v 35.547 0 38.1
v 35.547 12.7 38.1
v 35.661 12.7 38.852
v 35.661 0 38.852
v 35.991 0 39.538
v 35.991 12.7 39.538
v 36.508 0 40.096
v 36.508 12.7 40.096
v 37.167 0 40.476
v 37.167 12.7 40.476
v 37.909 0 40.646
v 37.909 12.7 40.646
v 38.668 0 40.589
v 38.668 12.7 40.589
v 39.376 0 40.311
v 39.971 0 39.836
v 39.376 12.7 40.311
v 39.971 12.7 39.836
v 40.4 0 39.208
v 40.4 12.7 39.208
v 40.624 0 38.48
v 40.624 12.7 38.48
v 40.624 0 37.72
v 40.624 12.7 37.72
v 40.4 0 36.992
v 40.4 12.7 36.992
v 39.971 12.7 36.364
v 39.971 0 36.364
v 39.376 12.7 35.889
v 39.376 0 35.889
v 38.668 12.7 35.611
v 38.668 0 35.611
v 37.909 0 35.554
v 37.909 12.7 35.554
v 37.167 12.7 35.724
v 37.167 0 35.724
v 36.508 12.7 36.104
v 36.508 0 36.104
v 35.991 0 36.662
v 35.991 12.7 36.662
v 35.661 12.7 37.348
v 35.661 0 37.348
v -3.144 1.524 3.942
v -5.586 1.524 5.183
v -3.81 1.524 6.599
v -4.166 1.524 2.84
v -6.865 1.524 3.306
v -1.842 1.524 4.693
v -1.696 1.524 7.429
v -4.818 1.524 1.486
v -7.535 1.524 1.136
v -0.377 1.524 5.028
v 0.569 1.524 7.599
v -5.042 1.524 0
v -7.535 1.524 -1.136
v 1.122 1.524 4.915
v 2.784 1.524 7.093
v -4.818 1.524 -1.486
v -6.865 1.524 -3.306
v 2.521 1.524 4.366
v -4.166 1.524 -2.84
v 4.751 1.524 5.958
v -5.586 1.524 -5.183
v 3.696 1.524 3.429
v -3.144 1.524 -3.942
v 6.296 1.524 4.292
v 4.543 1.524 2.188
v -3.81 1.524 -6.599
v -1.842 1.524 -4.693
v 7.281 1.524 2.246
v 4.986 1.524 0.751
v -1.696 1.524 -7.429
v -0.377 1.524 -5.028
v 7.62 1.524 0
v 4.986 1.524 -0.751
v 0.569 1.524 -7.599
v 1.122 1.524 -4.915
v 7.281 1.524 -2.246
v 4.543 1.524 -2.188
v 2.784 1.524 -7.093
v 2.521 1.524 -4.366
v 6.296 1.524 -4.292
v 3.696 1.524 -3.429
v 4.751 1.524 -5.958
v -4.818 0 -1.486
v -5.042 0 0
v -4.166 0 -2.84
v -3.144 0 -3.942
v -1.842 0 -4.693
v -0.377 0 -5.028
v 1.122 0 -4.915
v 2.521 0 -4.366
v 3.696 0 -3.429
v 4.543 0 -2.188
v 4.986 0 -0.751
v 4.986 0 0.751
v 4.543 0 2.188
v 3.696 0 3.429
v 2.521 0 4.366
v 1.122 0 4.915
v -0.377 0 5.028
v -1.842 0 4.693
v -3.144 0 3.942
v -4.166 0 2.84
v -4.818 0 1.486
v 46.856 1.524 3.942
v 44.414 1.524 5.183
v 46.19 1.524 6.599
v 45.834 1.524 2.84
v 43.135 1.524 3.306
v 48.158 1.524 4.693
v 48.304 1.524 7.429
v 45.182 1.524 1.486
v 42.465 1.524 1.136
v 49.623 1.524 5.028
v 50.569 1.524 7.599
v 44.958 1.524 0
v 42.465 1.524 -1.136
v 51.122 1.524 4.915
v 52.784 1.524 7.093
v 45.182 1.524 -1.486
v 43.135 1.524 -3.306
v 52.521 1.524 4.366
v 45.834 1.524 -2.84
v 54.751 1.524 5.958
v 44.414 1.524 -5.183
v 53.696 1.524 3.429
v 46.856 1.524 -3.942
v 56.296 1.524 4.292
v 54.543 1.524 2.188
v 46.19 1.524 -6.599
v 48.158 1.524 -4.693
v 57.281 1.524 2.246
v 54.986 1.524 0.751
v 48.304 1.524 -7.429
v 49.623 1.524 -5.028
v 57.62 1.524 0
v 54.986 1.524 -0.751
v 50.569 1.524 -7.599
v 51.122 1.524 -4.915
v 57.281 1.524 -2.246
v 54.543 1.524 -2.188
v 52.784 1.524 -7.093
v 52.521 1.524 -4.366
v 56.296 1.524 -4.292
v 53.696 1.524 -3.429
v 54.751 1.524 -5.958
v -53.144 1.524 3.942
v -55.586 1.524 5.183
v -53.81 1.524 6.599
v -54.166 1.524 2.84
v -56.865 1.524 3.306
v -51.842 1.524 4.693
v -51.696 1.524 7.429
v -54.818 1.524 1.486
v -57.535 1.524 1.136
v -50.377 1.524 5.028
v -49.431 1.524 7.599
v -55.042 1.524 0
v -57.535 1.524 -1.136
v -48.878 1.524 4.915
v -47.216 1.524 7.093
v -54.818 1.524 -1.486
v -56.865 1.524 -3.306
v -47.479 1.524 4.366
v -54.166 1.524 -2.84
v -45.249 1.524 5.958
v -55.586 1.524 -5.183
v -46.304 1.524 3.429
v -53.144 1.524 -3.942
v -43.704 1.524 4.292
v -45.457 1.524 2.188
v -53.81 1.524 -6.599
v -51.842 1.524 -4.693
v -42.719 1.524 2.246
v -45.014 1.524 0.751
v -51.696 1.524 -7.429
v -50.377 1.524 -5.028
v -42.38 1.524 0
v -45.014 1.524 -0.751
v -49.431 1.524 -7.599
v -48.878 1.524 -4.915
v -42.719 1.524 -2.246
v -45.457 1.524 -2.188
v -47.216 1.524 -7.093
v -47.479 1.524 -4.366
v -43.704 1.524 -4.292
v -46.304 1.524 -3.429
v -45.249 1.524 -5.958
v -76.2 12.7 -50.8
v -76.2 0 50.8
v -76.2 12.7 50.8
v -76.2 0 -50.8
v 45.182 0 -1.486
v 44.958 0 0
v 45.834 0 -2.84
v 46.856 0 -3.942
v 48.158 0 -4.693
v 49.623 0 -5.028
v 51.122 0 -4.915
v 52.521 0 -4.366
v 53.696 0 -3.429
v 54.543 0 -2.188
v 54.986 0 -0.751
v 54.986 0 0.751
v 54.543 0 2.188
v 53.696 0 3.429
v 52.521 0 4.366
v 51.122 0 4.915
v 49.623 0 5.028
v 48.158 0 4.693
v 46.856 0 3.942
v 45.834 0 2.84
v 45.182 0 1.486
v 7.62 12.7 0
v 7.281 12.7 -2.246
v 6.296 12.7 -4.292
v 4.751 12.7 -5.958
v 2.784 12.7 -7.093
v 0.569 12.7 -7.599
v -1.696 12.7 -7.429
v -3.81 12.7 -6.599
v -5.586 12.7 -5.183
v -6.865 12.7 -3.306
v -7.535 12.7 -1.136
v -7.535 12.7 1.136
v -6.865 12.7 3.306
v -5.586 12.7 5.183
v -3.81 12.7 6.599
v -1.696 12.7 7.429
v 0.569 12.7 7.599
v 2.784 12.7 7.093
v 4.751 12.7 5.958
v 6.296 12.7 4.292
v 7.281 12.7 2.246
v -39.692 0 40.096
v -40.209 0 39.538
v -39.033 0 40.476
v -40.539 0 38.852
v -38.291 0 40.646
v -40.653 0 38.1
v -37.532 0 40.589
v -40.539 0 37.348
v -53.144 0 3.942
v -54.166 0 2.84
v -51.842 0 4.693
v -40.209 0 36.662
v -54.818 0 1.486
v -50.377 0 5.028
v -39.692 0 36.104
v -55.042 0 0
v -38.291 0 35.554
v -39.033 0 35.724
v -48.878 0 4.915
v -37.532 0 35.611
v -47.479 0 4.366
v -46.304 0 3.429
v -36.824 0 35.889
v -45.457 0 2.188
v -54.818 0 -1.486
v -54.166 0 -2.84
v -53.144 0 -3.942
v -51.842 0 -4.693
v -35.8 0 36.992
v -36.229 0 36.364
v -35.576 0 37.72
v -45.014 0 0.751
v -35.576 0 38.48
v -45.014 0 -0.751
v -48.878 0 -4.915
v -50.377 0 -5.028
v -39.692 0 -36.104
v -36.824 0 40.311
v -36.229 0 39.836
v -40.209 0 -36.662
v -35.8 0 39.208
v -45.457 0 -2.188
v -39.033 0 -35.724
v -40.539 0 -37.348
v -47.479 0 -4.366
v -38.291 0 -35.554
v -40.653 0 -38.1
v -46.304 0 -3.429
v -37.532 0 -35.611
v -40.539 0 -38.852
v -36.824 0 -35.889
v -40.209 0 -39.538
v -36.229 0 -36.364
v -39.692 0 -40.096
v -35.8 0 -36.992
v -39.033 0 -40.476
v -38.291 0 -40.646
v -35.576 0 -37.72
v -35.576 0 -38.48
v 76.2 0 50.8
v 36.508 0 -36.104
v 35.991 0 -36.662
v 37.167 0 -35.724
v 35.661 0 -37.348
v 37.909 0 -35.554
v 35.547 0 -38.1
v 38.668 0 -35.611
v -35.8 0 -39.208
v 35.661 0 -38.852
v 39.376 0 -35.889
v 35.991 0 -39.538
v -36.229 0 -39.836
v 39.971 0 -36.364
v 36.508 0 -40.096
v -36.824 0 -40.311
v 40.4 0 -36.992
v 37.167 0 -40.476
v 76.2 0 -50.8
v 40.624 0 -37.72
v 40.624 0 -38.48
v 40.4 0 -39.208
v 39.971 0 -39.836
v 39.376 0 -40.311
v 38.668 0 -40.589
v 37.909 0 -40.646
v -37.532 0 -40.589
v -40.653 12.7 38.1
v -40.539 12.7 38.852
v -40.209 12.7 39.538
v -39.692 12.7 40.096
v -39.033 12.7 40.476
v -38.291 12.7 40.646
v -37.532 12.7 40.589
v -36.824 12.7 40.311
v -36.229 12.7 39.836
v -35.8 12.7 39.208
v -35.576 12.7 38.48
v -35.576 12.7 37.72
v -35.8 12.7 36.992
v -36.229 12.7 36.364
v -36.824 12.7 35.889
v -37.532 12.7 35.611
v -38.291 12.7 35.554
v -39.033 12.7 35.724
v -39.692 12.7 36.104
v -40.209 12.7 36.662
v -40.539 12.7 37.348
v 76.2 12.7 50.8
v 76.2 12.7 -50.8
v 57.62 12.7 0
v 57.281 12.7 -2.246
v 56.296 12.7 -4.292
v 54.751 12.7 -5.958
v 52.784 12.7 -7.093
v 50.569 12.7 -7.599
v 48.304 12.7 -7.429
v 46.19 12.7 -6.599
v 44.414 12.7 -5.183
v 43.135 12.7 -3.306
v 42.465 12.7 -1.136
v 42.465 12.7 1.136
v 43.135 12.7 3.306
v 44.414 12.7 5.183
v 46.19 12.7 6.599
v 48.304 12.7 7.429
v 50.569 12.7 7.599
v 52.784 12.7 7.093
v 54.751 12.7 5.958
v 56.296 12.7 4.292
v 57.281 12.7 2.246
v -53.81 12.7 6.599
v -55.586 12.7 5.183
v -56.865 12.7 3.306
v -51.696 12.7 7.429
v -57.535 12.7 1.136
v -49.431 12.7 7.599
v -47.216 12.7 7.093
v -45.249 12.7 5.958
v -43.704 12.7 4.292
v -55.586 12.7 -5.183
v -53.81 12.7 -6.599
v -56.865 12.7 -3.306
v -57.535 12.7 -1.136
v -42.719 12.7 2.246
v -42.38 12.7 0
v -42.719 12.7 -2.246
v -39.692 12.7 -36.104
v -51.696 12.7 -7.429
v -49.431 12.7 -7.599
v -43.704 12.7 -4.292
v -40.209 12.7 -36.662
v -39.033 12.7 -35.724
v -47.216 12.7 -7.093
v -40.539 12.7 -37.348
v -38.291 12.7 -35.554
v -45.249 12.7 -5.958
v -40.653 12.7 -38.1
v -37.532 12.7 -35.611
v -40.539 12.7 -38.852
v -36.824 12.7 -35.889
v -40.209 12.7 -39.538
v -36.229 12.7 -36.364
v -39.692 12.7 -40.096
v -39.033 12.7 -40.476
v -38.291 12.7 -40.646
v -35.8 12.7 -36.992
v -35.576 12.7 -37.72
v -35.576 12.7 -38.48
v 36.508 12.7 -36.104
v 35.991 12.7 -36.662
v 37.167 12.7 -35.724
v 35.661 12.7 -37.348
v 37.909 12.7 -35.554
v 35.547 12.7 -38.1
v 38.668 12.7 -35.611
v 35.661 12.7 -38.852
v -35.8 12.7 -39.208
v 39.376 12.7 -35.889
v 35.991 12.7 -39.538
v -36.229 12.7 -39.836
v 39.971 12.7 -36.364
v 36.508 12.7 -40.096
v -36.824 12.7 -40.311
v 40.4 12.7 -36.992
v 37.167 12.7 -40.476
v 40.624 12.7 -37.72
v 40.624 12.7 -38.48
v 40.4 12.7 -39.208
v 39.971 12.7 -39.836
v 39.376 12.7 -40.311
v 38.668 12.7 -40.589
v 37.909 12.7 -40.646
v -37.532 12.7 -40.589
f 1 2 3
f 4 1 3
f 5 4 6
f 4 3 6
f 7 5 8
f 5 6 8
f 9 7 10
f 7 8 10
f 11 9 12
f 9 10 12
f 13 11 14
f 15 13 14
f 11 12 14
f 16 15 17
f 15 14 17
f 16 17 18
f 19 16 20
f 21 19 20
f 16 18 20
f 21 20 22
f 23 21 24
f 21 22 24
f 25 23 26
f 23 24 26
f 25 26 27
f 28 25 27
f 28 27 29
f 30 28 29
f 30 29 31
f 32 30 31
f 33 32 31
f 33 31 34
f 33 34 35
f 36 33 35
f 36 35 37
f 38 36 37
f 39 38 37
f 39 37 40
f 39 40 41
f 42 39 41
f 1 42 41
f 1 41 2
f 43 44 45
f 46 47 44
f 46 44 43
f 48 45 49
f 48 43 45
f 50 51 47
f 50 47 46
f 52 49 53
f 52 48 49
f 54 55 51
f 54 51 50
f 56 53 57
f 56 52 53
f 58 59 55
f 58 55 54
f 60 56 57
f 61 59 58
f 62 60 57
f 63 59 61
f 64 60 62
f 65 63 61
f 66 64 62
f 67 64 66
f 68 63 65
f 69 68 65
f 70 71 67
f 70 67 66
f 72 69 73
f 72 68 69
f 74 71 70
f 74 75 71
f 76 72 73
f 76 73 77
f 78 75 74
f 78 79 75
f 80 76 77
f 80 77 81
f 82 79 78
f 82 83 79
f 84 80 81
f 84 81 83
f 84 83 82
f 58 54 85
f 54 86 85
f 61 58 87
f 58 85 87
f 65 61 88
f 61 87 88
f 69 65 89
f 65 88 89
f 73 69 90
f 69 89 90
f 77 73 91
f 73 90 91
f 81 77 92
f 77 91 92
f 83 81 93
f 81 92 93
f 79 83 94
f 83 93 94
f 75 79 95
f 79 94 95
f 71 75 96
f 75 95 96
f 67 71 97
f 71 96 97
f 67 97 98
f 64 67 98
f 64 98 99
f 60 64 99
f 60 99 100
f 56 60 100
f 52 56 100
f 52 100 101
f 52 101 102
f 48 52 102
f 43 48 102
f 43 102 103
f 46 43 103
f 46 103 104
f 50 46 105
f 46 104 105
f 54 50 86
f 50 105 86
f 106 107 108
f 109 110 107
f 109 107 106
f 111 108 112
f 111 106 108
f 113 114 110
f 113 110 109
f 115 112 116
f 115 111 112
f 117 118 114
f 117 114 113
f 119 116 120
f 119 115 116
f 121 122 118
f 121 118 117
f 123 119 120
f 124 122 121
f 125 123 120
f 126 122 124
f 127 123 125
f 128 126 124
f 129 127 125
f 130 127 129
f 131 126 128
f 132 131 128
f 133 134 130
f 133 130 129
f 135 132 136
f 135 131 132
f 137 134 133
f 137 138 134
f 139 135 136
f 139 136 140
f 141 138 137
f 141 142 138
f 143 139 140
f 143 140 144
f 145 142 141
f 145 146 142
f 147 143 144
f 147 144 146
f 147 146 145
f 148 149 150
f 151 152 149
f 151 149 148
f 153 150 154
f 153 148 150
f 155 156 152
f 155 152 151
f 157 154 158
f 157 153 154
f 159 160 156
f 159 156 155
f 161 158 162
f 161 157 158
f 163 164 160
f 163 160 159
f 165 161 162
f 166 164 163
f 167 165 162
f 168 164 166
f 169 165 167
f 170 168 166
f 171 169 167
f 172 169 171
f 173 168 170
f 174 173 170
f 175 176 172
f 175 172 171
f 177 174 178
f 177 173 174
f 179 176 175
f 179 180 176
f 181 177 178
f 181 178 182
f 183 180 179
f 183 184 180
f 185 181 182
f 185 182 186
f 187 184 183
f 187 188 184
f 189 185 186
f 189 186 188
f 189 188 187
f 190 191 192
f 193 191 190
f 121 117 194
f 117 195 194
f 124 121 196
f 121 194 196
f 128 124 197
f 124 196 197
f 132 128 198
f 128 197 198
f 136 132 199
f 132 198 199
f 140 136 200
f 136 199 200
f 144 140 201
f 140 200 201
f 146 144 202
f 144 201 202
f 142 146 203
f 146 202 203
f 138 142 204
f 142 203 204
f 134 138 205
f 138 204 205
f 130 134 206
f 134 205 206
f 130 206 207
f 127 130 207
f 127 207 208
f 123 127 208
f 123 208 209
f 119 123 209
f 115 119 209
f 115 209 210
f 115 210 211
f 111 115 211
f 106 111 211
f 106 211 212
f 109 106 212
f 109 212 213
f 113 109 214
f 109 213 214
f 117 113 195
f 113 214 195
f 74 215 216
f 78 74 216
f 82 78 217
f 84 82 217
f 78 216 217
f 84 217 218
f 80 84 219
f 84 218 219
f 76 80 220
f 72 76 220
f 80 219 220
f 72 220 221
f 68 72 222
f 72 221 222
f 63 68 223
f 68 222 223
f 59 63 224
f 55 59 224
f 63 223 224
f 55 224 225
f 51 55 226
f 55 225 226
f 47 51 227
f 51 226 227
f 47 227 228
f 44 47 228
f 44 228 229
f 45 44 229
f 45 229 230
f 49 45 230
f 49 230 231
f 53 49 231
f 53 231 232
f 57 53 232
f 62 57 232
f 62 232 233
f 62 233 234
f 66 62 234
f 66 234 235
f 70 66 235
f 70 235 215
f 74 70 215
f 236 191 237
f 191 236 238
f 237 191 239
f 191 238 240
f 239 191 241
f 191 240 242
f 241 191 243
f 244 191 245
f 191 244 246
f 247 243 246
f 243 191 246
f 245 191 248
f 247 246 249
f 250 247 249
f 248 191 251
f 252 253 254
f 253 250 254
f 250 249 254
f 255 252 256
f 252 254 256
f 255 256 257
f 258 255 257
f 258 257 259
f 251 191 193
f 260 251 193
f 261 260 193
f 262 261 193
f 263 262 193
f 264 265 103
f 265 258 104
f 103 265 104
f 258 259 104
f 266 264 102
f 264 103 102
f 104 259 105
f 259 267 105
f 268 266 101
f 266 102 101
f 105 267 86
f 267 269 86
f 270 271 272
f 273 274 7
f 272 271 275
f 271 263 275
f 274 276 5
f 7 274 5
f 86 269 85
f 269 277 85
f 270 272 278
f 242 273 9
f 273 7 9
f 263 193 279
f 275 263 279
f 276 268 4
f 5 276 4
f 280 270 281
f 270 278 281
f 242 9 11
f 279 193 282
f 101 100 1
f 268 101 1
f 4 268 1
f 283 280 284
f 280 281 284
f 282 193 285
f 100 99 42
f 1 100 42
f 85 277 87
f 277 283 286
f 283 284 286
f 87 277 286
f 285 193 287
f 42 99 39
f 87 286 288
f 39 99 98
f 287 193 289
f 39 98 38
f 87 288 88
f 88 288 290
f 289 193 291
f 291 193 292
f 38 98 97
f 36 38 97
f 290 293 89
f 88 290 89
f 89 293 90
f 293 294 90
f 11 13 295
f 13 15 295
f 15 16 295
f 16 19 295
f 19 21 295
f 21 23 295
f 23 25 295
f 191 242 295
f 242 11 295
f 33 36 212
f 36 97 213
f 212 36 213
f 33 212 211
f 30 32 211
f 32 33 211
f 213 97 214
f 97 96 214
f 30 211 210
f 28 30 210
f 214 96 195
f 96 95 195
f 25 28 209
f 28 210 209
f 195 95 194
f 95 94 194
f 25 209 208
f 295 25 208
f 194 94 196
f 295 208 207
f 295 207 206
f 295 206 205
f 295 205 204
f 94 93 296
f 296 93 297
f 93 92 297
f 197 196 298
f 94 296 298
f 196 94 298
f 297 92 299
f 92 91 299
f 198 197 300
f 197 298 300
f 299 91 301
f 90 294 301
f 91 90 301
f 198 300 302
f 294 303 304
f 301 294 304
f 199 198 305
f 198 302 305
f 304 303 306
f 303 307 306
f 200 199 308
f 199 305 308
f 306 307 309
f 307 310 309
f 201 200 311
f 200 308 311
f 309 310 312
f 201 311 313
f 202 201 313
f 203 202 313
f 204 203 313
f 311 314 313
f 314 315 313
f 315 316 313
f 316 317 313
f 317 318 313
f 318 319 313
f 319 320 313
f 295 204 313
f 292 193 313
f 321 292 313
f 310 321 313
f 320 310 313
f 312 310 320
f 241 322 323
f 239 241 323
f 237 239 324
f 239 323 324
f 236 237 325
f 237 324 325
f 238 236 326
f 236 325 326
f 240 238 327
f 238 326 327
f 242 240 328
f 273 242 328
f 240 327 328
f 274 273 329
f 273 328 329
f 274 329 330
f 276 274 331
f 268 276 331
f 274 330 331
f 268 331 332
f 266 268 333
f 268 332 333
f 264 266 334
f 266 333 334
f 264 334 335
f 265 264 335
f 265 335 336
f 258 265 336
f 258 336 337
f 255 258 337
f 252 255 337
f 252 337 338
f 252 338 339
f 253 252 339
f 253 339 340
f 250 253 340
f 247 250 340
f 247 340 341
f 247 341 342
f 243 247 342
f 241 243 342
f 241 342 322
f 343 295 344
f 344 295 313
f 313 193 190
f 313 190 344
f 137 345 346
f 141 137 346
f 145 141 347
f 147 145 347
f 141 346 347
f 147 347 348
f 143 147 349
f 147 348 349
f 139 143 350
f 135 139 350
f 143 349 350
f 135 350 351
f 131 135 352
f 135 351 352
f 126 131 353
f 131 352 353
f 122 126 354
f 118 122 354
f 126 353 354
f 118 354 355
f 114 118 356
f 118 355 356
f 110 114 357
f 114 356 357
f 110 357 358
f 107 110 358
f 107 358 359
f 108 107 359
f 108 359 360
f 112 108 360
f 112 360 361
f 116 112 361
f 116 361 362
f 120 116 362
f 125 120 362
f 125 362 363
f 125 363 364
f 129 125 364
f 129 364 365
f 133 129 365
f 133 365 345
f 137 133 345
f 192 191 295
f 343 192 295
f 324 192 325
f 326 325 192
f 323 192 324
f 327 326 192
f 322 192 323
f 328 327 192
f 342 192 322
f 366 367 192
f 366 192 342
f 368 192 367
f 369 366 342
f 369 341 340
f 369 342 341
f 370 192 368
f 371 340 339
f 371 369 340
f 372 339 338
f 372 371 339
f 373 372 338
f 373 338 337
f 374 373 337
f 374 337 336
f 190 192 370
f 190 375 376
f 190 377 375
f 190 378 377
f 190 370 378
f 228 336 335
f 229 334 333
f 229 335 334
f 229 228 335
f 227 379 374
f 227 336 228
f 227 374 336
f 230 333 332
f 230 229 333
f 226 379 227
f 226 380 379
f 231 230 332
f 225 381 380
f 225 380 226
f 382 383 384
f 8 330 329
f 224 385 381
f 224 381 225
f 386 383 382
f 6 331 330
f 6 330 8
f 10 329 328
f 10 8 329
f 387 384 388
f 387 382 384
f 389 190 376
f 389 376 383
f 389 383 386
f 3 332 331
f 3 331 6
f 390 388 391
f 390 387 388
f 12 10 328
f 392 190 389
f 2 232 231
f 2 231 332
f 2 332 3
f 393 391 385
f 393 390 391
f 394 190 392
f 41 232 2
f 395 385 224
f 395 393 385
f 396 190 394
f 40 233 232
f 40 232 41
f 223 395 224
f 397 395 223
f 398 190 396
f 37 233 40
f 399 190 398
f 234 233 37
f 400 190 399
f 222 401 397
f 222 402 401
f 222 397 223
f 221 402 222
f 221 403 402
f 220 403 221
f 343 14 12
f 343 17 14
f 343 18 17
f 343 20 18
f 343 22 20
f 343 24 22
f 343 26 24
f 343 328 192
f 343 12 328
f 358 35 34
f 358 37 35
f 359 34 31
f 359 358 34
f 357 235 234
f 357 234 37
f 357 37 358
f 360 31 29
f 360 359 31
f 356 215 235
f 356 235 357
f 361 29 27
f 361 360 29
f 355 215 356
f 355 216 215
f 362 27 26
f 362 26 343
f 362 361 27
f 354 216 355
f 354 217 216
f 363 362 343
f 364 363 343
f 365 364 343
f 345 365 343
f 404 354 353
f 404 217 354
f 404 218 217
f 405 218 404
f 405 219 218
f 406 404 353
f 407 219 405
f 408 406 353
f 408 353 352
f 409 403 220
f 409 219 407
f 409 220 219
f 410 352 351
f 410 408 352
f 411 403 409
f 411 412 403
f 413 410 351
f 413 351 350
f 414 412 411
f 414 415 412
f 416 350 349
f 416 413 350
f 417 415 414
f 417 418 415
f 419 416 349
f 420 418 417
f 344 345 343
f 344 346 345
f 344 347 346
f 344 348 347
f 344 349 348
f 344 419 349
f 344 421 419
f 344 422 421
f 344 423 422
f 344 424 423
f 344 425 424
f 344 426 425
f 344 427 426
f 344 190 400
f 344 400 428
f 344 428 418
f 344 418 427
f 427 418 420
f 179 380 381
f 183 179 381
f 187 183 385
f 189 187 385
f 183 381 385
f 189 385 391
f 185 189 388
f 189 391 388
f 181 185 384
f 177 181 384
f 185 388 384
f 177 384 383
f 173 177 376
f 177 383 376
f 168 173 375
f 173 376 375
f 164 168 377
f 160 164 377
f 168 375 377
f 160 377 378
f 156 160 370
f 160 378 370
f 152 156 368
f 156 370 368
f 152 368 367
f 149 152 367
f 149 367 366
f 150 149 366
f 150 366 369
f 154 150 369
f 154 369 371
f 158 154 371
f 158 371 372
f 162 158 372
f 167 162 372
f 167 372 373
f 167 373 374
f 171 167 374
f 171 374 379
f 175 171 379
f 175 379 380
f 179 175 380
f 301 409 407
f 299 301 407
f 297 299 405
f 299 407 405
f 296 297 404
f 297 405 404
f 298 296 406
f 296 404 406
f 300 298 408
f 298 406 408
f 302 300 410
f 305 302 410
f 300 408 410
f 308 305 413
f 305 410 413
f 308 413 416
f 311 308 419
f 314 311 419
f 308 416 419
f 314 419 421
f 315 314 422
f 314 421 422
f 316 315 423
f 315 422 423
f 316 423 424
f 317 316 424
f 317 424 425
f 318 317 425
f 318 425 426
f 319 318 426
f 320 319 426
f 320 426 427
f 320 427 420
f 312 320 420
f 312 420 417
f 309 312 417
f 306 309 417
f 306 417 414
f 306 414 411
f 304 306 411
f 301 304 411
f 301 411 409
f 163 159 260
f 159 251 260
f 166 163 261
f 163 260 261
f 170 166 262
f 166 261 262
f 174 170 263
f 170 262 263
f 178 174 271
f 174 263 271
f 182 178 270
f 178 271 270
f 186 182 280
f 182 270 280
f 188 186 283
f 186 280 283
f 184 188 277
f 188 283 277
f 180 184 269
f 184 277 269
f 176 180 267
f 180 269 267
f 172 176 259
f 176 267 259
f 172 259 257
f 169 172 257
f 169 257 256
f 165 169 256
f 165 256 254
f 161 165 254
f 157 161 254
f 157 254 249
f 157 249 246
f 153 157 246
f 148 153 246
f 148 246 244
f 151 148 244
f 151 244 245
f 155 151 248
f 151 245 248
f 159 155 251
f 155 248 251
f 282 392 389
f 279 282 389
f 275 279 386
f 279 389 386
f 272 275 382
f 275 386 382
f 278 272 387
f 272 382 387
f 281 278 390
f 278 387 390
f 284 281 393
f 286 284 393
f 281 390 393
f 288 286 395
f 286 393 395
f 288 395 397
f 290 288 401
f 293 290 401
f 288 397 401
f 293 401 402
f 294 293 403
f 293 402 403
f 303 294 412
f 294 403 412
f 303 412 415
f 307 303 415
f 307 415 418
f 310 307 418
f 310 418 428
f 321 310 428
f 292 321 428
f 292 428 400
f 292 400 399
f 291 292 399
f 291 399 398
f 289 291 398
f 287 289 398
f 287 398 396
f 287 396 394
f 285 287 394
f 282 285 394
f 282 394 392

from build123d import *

# Parameters (mm, degrees)
SKETCH1_W                                = 152.4
SKETCH1_H                                = 101.6
BOSS_EXTRUDE1_DEPTH                      = 12.7
CBORE_FOR_3_8_HEX_HEAD_BOLT1_D           = 10.0838
CBORE_FOR_3_8_HEX_HEAD_BOLT1_CBORE_D     = 15.24
CBORE_FOR_3_8_HEX_HEAD_BOLT1_CBORE_DEPTH = 11.176
TAP_DRILL_FOR_1_4_20_TAP1_D              = 5.1054


with BuildPart() as part:
    # Sketch1 → Boss-Extrude1 (new body)
    with BuildSketch(Plane(origin=(0, 0, 0), x_dir=(1, 0, 0), z_dir=(0, 1, 0))):
        Rectangle(SKETCH1_W, SKETCH1_H)
    extrude(amount=BOSS_EXTRUDE1_DEPTH)

    # CBORE for 3/8 Hex Head Bolt1 (through all)
    with Locations(Plane(origin=(0, 12.7, 0), x_dir=(1, 0, 0), z_dir=(0, 1, 0))):
        with Locations((-50.000000076, 0), (50.000000076, 0), (0, 0)):
            CounterBoreHole(CBORE_FOR_3_8_HEX_HEAD_BOLT1_D / 2, CBORE_FOR_3_8_HEX_HEAD_BOLT1_CBORE_D / 2, CBORE_FOR_3_8_HEX_HEAD_BOLT1_CBORE_DEPTH)

    # Tap Drill for 1/4-20 Tap1 (through all)
    with Locations(Plane.XZ):
        with Locations((-38.1, -38.1), (38.1, -38.1), (38.1, 38.1), (-38.1, 38.1)):
            Hole(TAP_DRILL_FOR_1_4_20_TAP1_D / 2)


solid = part.part
